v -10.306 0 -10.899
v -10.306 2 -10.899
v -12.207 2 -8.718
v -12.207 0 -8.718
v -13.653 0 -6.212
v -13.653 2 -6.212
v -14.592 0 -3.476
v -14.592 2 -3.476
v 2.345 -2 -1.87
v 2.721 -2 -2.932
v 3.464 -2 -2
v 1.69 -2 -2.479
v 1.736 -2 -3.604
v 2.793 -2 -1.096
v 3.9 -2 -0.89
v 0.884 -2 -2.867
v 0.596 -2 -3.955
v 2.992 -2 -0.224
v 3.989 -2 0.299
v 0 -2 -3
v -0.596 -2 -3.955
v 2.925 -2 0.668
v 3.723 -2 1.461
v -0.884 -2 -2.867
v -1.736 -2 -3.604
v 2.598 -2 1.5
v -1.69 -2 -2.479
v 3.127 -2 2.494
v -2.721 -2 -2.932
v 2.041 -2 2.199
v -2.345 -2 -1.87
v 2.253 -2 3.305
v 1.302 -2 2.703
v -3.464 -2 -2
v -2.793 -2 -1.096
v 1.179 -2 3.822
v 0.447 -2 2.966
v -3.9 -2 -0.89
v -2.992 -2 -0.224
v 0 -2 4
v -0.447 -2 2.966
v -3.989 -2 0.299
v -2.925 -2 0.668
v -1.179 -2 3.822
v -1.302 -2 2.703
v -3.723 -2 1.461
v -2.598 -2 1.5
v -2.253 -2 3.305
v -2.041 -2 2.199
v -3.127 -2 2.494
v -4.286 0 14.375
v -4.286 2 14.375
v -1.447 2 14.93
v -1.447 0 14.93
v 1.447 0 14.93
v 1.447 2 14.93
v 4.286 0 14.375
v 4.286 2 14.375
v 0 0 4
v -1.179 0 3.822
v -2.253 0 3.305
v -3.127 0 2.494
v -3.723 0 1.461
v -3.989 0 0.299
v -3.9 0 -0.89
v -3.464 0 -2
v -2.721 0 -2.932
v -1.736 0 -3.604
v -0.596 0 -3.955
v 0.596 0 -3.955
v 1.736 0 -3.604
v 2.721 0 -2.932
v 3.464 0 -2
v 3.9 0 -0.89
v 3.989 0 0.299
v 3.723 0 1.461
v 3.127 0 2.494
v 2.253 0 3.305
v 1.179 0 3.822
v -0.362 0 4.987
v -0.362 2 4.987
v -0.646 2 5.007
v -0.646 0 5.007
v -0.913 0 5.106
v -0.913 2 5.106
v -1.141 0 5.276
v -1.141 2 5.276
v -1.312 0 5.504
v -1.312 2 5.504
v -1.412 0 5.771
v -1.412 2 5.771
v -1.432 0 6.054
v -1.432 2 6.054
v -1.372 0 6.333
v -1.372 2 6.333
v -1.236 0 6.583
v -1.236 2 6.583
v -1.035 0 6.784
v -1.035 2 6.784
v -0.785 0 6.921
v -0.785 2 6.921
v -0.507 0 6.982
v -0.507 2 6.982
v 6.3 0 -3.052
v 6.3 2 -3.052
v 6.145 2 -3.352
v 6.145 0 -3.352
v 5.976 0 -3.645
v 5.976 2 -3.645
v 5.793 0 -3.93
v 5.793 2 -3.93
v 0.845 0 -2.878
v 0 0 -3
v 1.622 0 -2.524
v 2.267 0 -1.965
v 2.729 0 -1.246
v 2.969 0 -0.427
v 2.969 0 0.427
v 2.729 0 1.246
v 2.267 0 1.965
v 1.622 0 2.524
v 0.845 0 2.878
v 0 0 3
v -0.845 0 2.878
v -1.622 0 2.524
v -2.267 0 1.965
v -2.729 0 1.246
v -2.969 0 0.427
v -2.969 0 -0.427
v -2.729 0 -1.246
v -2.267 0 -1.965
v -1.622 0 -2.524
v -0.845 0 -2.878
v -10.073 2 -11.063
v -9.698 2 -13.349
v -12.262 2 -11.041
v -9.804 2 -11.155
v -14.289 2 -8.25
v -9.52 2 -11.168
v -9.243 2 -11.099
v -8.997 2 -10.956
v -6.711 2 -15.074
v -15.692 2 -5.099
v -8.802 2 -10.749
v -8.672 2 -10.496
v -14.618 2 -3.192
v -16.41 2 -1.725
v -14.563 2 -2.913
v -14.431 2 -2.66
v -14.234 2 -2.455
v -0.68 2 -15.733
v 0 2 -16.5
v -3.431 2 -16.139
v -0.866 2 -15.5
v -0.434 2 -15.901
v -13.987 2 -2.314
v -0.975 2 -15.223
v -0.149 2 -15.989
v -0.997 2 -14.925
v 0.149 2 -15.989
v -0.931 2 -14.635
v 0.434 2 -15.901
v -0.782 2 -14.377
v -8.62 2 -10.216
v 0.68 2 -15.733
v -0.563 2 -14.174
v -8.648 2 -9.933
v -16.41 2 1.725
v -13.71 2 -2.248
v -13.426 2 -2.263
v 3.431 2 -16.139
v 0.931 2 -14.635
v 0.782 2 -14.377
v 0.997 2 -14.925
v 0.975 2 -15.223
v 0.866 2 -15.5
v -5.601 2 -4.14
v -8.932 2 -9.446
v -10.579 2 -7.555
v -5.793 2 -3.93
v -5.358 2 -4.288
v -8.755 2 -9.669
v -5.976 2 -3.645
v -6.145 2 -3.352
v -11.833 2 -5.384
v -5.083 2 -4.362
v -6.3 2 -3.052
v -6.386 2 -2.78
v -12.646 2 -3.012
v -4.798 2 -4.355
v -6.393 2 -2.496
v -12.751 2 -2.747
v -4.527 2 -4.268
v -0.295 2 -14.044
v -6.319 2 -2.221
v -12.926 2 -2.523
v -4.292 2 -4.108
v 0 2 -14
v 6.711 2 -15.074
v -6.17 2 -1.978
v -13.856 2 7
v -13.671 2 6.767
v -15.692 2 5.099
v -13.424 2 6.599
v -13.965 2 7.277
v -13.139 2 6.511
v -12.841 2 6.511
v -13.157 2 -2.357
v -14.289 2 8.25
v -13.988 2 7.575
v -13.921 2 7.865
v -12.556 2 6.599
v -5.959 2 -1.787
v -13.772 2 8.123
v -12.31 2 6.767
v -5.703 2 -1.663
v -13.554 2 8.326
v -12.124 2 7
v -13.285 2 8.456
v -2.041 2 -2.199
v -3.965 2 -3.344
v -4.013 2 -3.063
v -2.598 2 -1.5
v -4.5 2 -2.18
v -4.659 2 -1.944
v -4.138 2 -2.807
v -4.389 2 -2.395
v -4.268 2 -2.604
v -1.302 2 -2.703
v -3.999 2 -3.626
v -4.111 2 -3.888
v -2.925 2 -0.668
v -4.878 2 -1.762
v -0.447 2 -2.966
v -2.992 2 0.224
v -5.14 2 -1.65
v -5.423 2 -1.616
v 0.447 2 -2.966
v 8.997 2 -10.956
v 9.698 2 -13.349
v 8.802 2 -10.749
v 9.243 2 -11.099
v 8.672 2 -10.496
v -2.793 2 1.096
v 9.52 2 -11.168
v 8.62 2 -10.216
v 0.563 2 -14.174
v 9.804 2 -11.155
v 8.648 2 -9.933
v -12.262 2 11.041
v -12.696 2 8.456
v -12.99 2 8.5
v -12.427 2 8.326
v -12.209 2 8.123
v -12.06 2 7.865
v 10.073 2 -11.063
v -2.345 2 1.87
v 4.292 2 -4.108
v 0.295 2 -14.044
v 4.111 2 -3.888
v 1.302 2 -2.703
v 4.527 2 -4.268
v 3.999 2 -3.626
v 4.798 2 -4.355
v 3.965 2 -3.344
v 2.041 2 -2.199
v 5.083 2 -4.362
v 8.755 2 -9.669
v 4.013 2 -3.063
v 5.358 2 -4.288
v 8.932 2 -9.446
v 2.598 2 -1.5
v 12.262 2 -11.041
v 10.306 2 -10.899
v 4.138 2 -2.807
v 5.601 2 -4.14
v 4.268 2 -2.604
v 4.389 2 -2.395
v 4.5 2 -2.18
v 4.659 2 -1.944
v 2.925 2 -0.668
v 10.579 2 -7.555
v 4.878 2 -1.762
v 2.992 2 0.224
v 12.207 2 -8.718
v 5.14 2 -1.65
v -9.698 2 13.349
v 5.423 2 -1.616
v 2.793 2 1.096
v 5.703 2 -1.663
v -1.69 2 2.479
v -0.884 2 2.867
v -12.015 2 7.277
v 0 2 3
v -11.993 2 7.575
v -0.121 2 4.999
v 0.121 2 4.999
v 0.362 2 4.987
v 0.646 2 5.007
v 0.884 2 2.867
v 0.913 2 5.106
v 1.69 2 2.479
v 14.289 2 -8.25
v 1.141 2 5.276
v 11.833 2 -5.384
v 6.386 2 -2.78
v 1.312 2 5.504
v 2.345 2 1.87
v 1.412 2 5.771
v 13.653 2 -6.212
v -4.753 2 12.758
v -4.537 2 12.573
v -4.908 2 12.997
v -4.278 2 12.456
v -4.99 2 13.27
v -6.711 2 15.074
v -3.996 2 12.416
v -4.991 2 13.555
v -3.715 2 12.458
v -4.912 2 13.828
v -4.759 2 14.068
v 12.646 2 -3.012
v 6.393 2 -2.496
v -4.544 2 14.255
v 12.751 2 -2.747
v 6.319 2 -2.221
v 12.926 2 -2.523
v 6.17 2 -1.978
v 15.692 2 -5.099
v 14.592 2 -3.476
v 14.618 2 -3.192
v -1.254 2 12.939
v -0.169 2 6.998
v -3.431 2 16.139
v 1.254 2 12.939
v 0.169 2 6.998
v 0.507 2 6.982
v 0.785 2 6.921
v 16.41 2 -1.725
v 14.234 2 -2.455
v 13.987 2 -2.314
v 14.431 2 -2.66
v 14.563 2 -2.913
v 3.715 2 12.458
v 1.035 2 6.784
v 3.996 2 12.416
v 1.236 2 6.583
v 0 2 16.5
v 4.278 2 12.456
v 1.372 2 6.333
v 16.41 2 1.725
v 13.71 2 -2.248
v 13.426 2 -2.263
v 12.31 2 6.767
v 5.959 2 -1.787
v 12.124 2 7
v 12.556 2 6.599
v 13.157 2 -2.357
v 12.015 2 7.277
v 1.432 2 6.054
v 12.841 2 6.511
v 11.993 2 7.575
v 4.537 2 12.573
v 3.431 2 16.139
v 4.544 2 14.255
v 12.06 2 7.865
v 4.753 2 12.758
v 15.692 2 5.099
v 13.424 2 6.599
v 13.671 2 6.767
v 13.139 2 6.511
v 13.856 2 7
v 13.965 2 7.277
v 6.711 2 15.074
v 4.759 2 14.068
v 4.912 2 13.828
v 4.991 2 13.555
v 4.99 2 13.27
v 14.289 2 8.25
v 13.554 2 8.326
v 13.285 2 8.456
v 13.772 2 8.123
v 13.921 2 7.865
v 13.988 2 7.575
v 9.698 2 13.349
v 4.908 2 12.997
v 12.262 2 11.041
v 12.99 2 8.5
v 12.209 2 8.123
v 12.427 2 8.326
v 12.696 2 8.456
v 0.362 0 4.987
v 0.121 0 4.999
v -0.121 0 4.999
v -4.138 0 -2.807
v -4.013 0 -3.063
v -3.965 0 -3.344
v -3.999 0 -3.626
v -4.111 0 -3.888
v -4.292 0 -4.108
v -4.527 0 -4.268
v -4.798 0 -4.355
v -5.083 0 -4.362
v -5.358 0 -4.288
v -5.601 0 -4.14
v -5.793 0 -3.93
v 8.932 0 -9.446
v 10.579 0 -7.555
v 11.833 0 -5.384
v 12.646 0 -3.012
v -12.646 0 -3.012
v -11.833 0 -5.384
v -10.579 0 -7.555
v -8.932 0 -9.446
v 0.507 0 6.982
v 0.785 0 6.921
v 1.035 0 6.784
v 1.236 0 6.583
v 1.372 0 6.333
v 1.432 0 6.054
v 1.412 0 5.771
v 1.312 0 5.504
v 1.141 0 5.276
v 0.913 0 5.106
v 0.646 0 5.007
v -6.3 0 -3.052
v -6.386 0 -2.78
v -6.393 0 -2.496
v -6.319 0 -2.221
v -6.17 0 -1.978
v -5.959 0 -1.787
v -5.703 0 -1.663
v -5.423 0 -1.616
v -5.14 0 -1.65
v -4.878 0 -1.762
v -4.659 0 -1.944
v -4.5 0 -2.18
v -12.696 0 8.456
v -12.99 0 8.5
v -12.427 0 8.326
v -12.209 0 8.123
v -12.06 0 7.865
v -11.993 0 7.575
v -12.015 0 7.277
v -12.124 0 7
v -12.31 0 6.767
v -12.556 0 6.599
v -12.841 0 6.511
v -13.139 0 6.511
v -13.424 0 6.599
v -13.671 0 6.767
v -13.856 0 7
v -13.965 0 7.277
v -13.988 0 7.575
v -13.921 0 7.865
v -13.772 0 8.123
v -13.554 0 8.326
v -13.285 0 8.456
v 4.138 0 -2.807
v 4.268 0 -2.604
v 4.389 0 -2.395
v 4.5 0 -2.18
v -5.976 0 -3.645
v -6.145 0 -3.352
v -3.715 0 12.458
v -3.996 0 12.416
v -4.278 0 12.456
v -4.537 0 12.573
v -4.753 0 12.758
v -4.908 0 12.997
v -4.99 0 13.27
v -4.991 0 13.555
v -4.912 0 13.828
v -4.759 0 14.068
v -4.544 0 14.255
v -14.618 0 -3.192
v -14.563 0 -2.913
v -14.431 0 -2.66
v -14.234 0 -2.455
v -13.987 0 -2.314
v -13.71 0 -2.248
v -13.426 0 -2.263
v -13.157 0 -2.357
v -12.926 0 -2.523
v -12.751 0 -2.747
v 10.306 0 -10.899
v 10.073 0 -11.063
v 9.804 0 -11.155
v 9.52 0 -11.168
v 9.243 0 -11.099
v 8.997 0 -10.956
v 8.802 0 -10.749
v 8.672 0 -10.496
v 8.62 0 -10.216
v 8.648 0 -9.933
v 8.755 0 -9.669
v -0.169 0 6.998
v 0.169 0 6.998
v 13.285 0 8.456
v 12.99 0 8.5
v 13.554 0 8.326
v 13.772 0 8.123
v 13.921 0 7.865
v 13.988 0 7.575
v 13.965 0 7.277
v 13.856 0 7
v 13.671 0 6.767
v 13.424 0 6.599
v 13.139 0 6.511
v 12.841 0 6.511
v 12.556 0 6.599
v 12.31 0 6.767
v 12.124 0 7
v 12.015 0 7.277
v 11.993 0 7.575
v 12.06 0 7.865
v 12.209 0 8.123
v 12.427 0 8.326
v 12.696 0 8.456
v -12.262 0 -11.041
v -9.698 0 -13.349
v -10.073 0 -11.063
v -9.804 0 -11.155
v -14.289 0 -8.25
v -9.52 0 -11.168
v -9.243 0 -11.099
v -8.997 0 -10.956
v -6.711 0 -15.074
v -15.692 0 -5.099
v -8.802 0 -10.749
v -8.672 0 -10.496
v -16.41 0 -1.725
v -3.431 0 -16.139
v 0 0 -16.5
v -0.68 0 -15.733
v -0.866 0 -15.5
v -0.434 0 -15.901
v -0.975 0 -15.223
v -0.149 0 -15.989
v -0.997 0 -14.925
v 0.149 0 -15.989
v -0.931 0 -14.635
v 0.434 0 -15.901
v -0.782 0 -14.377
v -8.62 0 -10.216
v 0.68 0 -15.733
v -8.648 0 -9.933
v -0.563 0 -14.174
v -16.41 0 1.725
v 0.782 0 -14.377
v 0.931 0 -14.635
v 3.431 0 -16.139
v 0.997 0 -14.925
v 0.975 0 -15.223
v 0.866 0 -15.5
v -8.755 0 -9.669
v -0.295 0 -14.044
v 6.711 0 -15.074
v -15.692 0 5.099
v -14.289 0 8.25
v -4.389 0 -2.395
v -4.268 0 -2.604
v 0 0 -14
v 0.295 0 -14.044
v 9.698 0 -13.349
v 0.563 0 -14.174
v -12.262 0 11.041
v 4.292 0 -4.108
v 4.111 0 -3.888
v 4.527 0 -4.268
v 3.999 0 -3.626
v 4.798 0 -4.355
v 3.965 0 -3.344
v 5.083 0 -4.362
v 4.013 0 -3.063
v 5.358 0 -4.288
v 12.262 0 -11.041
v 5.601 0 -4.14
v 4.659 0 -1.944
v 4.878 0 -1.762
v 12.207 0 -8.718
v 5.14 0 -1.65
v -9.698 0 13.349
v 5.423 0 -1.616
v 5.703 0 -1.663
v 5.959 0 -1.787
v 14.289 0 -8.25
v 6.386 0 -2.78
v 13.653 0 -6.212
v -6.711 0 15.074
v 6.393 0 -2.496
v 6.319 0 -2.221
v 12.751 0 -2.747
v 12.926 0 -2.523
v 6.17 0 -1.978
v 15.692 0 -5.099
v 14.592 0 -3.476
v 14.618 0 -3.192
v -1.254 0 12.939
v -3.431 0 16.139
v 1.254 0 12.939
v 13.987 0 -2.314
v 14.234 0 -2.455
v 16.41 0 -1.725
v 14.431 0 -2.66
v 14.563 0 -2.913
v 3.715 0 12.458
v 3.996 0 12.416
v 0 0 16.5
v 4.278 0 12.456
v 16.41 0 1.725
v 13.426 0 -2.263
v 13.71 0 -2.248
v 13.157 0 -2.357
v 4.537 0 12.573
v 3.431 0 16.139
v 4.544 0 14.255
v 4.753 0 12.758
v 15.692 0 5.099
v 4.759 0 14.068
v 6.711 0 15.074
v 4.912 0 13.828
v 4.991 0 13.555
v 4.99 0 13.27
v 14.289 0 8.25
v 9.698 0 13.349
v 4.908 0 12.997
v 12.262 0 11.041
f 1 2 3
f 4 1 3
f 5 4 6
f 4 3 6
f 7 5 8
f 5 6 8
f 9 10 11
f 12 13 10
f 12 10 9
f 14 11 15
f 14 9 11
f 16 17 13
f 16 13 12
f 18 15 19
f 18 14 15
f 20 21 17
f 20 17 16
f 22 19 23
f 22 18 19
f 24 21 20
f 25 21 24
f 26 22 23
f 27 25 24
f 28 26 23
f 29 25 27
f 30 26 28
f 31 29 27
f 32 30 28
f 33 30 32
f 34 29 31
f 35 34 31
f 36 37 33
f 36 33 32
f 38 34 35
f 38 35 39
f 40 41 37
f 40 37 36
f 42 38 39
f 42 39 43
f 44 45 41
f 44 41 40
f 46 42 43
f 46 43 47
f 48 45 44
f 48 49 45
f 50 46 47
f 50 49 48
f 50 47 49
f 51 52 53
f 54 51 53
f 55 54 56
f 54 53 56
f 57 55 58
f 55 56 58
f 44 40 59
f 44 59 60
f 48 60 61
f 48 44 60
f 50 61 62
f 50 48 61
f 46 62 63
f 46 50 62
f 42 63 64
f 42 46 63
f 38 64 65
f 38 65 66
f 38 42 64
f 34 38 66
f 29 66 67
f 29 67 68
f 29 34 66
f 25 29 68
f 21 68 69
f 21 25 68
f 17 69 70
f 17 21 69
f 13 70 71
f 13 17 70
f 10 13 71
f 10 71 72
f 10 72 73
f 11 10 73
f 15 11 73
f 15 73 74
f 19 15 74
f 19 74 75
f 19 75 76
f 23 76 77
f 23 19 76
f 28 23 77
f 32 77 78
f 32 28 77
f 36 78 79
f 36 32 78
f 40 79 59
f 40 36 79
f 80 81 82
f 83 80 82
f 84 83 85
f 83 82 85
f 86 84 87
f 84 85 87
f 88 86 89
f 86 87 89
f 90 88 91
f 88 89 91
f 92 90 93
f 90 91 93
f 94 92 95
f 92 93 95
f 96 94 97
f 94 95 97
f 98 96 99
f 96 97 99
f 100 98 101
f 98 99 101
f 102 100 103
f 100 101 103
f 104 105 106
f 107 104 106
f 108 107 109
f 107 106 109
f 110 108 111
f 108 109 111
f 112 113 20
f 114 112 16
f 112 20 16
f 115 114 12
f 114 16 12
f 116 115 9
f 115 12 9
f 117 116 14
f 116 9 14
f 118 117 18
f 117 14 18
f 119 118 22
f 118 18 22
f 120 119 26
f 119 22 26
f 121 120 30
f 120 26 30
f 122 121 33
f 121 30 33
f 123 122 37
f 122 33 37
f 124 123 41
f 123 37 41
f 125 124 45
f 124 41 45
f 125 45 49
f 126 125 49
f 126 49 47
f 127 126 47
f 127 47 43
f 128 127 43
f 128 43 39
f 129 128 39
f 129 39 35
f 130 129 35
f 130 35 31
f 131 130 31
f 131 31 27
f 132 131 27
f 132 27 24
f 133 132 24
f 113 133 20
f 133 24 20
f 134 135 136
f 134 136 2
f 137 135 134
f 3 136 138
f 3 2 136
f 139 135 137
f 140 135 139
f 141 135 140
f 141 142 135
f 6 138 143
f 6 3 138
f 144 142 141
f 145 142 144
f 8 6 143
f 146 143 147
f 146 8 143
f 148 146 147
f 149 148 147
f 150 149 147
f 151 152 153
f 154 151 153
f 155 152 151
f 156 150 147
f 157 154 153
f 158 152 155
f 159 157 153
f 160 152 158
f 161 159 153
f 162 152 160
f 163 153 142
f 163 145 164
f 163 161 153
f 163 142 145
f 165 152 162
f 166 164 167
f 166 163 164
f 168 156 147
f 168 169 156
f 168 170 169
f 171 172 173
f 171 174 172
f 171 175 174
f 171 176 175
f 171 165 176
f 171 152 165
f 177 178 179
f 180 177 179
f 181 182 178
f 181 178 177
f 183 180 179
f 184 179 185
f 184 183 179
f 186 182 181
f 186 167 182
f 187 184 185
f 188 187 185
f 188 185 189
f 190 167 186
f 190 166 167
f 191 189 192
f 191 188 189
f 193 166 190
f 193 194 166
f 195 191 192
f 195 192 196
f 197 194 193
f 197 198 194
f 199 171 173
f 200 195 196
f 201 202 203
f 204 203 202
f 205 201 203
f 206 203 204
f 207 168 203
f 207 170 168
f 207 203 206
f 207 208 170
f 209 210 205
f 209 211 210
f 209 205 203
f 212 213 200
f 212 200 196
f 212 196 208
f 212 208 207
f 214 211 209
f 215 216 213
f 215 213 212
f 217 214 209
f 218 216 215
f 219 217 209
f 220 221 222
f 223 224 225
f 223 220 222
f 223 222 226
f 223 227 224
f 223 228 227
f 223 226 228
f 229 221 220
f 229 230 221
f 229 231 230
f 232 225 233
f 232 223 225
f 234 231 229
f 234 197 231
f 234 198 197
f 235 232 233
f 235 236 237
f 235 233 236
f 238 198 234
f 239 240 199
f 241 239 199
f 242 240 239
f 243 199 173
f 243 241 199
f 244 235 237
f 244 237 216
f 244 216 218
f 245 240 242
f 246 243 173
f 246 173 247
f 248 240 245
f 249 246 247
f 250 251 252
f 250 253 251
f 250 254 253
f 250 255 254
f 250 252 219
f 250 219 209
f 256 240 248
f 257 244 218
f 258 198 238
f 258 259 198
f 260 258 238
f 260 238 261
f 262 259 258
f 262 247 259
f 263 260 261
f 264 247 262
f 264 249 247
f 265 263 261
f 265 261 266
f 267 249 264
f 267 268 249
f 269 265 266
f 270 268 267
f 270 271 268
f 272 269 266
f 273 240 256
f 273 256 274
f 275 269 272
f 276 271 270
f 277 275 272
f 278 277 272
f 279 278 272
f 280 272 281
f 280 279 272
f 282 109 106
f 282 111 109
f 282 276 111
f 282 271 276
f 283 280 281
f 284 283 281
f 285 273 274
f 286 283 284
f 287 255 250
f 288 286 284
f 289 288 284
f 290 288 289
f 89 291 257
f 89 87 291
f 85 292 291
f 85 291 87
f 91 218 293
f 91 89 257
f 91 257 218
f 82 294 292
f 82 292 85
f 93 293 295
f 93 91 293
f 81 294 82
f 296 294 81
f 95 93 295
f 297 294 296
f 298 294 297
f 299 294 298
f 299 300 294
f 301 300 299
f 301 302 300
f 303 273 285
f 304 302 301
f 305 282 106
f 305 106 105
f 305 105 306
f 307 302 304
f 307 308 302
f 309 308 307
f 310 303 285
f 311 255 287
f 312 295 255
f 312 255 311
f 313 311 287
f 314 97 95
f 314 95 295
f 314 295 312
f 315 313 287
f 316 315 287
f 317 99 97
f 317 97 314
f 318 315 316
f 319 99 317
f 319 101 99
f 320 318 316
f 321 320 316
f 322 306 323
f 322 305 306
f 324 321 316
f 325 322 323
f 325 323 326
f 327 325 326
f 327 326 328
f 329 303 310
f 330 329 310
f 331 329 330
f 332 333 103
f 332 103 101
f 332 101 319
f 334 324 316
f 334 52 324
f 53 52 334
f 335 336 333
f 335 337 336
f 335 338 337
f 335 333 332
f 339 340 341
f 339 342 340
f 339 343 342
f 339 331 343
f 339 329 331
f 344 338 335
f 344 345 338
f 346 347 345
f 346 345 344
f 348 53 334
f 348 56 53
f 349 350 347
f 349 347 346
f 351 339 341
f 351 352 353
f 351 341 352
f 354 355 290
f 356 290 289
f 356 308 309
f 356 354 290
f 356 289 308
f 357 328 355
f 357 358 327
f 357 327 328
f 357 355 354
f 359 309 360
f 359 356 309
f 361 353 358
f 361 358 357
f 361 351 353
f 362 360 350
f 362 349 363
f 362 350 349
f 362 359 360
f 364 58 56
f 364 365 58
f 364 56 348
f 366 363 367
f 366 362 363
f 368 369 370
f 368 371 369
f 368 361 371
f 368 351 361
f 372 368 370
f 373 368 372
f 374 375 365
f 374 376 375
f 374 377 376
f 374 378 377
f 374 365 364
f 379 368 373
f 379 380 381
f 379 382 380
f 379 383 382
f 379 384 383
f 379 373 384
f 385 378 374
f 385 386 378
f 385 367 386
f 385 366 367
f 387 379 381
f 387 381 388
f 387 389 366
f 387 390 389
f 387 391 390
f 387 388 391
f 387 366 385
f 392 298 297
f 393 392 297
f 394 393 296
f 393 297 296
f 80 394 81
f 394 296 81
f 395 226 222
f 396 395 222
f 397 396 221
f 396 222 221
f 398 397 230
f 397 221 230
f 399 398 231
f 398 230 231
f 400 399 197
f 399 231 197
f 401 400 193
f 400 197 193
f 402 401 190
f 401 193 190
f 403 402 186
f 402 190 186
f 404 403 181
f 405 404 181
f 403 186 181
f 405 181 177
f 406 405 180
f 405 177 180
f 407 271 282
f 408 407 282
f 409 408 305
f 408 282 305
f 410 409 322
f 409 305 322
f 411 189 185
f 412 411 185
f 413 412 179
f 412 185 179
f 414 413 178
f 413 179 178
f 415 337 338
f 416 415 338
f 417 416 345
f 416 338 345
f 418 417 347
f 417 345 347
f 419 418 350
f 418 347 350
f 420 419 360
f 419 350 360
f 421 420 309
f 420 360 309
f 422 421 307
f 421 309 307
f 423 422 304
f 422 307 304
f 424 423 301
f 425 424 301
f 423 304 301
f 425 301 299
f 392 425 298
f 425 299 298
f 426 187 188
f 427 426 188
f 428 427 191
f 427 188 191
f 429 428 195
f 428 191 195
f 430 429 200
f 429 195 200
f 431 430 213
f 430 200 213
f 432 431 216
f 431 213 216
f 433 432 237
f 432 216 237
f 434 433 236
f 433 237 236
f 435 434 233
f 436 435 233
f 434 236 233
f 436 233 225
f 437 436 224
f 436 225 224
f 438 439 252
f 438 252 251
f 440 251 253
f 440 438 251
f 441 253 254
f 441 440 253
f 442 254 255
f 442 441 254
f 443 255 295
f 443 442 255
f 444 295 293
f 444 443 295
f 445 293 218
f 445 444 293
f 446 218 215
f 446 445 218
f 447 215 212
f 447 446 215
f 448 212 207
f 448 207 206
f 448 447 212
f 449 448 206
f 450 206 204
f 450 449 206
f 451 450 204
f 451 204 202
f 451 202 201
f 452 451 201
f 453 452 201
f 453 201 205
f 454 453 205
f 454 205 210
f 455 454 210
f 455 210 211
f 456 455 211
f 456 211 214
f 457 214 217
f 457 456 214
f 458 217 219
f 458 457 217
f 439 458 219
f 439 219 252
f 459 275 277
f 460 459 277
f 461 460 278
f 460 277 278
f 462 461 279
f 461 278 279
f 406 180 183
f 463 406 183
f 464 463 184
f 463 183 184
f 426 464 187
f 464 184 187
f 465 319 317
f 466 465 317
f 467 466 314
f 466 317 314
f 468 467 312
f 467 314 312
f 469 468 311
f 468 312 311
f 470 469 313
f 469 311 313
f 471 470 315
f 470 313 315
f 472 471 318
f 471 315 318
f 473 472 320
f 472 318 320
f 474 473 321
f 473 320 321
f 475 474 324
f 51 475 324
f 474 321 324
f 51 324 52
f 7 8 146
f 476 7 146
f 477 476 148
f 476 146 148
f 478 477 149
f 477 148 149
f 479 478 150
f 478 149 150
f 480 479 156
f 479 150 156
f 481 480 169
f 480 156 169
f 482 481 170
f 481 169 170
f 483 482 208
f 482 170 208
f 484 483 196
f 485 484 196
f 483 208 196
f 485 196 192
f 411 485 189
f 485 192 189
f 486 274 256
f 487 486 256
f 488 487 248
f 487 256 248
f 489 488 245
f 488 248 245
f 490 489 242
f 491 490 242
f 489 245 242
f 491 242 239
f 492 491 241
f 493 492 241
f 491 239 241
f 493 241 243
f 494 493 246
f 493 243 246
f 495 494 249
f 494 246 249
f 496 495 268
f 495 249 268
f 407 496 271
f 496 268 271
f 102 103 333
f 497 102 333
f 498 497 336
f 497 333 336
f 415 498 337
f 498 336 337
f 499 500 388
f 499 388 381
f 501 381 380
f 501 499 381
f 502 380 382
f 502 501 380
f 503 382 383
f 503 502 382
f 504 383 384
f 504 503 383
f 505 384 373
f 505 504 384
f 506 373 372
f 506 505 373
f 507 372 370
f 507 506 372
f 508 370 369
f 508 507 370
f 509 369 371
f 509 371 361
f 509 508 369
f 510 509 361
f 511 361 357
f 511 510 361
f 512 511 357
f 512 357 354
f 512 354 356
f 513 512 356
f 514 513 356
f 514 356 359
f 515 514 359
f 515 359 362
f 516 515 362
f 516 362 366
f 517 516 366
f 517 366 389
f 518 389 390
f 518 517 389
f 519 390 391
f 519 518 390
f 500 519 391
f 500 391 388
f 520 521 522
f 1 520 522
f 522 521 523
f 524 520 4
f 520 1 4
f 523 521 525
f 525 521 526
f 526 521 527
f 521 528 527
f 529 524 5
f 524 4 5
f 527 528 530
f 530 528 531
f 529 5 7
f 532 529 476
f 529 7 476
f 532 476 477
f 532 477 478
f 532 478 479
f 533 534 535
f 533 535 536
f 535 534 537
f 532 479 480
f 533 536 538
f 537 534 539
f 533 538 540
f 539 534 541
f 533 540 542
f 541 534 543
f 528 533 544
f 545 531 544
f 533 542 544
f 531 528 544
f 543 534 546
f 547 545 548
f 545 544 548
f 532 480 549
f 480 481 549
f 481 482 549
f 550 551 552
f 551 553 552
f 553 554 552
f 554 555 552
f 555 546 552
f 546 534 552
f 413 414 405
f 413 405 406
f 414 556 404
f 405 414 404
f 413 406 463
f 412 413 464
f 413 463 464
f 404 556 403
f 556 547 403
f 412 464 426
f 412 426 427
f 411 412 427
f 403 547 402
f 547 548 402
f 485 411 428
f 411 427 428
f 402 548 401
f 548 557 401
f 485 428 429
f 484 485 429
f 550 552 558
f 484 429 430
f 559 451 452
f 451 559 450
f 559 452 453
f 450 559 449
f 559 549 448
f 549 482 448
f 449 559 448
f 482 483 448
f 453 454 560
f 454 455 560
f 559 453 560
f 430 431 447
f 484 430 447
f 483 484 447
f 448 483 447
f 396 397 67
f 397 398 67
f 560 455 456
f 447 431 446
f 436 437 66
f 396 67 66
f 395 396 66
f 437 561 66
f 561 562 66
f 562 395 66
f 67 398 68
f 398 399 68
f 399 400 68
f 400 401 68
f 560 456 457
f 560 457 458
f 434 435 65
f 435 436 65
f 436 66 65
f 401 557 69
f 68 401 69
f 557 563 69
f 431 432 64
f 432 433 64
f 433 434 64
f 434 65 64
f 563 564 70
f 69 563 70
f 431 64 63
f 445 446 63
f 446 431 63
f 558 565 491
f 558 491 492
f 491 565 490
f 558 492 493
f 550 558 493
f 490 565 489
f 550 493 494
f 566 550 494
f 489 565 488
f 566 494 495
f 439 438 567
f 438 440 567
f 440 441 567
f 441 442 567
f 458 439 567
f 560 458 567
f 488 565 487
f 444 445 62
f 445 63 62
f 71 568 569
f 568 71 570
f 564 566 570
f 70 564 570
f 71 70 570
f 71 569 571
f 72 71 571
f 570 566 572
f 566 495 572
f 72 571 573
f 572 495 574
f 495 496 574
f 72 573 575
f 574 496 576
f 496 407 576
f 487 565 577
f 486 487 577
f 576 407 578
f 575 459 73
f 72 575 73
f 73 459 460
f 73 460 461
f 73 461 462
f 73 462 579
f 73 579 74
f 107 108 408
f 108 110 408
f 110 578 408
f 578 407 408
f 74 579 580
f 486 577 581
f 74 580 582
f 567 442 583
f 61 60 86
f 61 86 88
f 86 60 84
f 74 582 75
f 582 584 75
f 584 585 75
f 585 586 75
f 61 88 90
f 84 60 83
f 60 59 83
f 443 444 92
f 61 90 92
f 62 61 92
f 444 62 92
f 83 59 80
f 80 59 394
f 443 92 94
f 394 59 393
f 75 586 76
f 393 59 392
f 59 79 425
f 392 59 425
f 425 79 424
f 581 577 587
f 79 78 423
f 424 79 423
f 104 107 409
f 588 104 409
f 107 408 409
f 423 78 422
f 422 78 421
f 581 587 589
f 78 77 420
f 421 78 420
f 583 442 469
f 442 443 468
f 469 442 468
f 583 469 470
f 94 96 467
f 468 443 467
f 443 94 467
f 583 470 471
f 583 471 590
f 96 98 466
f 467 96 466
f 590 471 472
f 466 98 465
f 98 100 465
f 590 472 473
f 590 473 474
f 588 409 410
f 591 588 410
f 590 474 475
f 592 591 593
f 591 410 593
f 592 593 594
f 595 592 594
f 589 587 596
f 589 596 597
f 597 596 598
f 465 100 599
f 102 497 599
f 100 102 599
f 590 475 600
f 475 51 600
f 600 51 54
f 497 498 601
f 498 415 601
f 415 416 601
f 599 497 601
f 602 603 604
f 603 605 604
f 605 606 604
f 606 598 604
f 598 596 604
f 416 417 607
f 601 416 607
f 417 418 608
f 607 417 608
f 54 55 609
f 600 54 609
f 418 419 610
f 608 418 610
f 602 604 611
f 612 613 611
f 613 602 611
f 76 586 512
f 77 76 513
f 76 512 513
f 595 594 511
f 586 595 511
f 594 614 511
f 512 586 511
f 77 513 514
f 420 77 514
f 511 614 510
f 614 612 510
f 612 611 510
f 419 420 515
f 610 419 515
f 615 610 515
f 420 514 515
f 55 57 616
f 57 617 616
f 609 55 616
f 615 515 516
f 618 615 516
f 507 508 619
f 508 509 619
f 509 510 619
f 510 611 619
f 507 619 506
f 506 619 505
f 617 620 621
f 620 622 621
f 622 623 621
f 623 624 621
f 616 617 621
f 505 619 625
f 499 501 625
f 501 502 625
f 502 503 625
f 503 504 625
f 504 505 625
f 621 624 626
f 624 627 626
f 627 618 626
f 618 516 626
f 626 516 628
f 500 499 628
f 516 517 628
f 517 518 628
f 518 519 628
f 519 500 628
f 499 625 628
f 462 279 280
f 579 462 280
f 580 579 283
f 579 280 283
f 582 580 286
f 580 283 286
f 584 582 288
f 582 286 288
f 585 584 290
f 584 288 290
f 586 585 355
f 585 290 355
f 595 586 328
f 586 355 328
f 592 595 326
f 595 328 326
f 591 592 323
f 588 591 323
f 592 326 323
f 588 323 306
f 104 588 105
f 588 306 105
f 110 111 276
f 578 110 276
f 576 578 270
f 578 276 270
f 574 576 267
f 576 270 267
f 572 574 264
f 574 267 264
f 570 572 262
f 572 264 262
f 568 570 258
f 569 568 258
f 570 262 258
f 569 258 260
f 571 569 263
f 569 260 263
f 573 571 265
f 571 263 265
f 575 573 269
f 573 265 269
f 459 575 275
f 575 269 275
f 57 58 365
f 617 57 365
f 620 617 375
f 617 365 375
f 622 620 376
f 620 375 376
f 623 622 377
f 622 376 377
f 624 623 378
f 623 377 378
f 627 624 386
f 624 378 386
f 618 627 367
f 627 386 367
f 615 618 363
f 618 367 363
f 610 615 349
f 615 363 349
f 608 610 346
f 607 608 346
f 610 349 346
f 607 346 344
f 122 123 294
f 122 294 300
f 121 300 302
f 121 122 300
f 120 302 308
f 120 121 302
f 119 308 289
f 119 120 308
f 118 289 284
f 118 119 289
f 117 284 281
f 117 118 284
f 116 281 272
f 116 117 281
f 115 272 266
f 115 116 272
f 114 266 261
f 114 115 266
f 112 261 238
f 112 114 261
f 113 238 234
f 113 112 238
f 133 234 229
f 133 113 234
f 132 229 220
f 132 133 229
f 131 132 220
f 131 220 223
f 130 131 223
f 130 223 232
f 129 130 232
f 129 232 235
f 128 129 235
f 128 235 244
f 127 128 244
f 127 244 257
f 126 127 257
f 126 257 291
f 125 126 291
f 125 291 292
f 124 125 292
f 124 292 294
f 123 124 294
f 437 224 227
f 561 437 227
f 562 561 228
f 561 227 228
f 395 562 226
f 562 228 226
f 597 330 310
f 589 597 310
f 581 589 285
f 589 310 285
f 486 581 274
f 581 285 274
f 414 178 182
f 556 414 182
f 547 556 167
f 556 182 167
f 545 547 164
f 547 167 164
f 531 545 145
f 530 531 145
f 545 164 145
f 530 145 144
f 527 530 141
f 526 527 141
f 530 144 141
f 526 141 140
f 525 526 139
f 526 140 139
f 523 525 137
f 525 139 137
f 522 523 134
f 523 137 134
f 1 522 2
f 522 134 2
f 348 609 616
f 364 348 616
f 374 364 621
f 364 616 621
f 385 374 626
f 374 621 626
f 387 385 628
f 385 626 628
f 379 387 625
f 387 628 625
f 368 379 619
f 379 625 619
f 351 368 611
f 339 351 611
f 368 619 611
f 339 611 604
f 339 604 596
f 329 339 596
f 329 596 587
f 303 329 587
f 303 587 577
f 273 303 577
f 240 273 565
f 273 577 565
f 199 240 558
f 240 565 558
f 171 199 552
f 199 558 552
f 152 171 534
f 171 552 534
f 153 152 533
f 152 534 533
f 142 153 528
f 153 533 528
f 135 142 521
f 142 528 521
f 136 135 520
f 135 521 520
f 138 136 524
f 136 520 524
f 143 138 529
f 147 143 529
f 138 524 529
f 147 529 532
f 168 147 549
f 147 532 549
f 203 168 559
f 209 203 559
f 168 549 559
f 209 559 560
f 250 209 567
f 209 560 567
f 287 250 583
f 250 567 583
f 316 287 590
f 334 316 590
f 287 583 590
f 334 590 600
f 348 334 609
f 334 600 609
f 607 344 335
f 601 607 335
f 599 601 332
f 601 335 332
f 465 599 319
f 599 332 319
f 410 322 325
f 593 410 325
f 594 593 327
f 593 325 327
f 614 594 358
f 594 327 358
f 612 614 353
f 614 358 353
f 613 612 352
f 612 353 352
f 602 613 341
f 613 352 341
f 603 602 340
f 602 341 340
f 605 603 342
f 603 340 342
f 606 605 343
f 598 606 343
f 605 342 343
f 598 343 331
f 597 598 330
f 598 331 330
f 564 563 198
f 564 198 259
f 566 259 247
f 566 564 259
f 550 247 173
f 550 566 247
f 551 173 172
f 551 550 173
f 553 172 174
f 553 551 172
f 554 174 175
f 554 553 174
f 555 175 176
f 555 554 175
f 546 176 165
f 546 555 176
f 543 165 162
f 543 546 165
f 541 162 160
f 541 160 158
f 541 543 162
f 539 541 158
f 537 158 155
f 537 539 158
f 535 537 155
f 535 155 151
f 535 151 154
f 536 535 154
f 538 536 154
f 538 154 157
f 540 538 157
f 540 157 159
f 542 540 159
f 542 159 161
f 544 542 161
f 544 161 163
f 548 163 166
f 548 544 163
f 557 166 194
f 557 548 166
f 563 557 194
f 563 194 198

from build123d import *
from build123d.topology import SkipClean

# Parameters (mm, degrees)
SKETCH_1_R          = 16.5
SKETCH_1_R_2        = 1
SKETCH_1_R_3        = 3
EXTRUDE_1_DEPTH     = 2
EXTRUDE_START       = 2
SKETCH_2_R          = 4
SKETCH_2_R_2        = 3
EXTRUDE_2_DEPTH     = 2
CUT_EXTRUDE_1_DEPTH = 2


with BuildPart() as part:
    # 草图1 → 凸台-拉伸1 (new body)
    with BuildSketch(Plane(origin=(0, 0, 0), x_dir=(1, 0, 0), z_dir=(0, 1, 0))):
        with Locations(Location((0, 0, 0), (0, 0, 270))):
            Circle(SKETCH_1_R)
        with Locations(Location((0, 15, 0), (0, 0, 270))):
            Circle(SKETCH_1_R_2, mode=Mode.SUBTRACT)
        with Locations(Location((0, 0, 0), (0, 0, 270))):
            Circle(SKETCH_1_R_3, mode=Mode.SUBTRACT)
        with Locations(Location((12.990381057, -7.5, 0), (0, 0, 270))):
            Circle(SKETCH_1_R_2, mode=Mode.SUBTRACT)
        with Locations(Location((-12.990381057, -7.5, 0), (0, 0, 270))):
            Circle(SKETCH_1_R_2, mode=Mode.SUBTRACT)
    extrude(amount=EXTRUDE_1_DEPTH)

    # 草图2 → 凸台-拉伸2 (add)
    with SkipClean():  # the faces are left unmerged after this step: merging them gives an invalid solid
        with BuildSketch(Plane.XZ.offset(EXTRUDE_START)):
            with Locations(Location((0, 0, 0), (0, 0, 90))):
                Circle(SKETCH_2_R)
            with Locations(Location((0, 0, 0), (0, 0, 270))):
                Circle(SKETCH_2_R_2, mode=Mode.SUBTRACT)
        extrude(amount=-EXTRUDE_2_DEPTH)

    # 草图3 → 切除-拉伸1 (cut)
    with SkipClean():  # the faces are left unmerged after this step: merging them gives an invalid solid
        with BuildSketch(Plane(origin=(0, 2, 0), x_dir=(1, 0, 0), z_dir=(0, 1, 0))):
            with BuildLine():
                ThreePointArc((14.591807471, 3.475507836), (12.990381057, 7.5), (10.305781813, 10.899122039))
                ThreePointArc((10.305781813, 10.899122039), (8.892121556, 10.859566024), (8.931677571, 9.445905767))
                ThreePointArc((8.931677571, 9.445905767), (11.258330249, 6.5), (12.646233142, 3.012106791))
                ThreePointArc((12.646233142, 3.012106791), (13.850720829, 2.271020149), (14.591807471, 3.475507836))
            make_face()
            with BuildLine():
                ThreePointArc((6.299818145, 3.051604716), (6.062177826, 3.5), (5.792676279, 3.930000194))
                ThreePointArc((5.792676279, 3.930000194), (4.403722497, 4.196096778), (4.137625913, 2.807142996))
                ThreePointArc((4.137625913, 2.807142996), (4.330127019, 2.5), (4.499870103, 2.179717654))
                ThreePointArc((4.499870103, 2.179717654), (5.835787655, 1.715687165), (6.299818145, 3.051604716))
            make_face()
            with BuildLine():
                ThreePointArc((-4.286025658, -14.374629875), (0, -15), (4.286025658, -14.374629875))
                ThreePointArc((4.286025658, -14.374629875), (4.958599273, -13.130586173), (3.714555571, -12.458012559))
                ThreePointArc((3.714555571, -12.458012559), (0, -13), (-3.714555571, -12.458012559))
                ThreePointArc((-3.714555571, -12.458012559), (-4.958599273, -13.130586173), (-4.286025658, -14.374629875))
            make_face()
            with BuildLine():
                ThreePointArc((-0.507141866, -6.981604911), (0, -7), (0.507141866, -6.981604911))
                ThreePointArc((0.507141866, -6.981604911), (1.432065158, -5.911783943), (0.36224419, -4.98686065))
                ThreePointArc((0.36224419, -4.98686065), (0, -5), (-0.36224419, -4.98686065))
                ThreePointArc((-0.36224419, -4.98686065), (-1.432065158, -5.911783943), (-0.507141866, -6.981604911))
            make_face()
            with BuildLine():
                ThreePointArc((-10.305781813, 10.899122039), (-12.990381057, 7.5), (-14.591807471, 3.475507836))
                ThreePointArc((-14.591807471, 3.475507836), (-13.850720829, 2.271020149), (-12.646233142, 3.012106791))
                ThreePointArc((-12.646233142, 3.012106791), (-11.258330249, 6.5), (-8.931677571, 9.445905767))
                ThreePointArc((-8.931677571, 9.445905767), (-8.892121556, 10.859566024), (-10.305781813, 10.899122039))
            make_face()
            with BuildLine():
                ThreePointArc((-5.792676279, 3.930000194), (-6.062177826, 3.5), (-6.299818145, 3.051604716))
                ThreePointArc((-6.299818145, 3.051604716), (-5.835787655, 1.715687165), (-4.499870103, 2.179717654))
                ThreePointArc((-4.499870103, 2.179717654), (-4.330127019, 2.5), (-4.137625913, 2.807142996))
                ThreePointArc((-4.137625913, 2.807142996), (-4.403722497, 4.196096778), (-5.792676279, 3.930000194))
            make_face()
        extrude(amount=-CUT_EXTRUDE_1_DEPTH, mode=Mode.SUBTRACT)


solid = part.part
